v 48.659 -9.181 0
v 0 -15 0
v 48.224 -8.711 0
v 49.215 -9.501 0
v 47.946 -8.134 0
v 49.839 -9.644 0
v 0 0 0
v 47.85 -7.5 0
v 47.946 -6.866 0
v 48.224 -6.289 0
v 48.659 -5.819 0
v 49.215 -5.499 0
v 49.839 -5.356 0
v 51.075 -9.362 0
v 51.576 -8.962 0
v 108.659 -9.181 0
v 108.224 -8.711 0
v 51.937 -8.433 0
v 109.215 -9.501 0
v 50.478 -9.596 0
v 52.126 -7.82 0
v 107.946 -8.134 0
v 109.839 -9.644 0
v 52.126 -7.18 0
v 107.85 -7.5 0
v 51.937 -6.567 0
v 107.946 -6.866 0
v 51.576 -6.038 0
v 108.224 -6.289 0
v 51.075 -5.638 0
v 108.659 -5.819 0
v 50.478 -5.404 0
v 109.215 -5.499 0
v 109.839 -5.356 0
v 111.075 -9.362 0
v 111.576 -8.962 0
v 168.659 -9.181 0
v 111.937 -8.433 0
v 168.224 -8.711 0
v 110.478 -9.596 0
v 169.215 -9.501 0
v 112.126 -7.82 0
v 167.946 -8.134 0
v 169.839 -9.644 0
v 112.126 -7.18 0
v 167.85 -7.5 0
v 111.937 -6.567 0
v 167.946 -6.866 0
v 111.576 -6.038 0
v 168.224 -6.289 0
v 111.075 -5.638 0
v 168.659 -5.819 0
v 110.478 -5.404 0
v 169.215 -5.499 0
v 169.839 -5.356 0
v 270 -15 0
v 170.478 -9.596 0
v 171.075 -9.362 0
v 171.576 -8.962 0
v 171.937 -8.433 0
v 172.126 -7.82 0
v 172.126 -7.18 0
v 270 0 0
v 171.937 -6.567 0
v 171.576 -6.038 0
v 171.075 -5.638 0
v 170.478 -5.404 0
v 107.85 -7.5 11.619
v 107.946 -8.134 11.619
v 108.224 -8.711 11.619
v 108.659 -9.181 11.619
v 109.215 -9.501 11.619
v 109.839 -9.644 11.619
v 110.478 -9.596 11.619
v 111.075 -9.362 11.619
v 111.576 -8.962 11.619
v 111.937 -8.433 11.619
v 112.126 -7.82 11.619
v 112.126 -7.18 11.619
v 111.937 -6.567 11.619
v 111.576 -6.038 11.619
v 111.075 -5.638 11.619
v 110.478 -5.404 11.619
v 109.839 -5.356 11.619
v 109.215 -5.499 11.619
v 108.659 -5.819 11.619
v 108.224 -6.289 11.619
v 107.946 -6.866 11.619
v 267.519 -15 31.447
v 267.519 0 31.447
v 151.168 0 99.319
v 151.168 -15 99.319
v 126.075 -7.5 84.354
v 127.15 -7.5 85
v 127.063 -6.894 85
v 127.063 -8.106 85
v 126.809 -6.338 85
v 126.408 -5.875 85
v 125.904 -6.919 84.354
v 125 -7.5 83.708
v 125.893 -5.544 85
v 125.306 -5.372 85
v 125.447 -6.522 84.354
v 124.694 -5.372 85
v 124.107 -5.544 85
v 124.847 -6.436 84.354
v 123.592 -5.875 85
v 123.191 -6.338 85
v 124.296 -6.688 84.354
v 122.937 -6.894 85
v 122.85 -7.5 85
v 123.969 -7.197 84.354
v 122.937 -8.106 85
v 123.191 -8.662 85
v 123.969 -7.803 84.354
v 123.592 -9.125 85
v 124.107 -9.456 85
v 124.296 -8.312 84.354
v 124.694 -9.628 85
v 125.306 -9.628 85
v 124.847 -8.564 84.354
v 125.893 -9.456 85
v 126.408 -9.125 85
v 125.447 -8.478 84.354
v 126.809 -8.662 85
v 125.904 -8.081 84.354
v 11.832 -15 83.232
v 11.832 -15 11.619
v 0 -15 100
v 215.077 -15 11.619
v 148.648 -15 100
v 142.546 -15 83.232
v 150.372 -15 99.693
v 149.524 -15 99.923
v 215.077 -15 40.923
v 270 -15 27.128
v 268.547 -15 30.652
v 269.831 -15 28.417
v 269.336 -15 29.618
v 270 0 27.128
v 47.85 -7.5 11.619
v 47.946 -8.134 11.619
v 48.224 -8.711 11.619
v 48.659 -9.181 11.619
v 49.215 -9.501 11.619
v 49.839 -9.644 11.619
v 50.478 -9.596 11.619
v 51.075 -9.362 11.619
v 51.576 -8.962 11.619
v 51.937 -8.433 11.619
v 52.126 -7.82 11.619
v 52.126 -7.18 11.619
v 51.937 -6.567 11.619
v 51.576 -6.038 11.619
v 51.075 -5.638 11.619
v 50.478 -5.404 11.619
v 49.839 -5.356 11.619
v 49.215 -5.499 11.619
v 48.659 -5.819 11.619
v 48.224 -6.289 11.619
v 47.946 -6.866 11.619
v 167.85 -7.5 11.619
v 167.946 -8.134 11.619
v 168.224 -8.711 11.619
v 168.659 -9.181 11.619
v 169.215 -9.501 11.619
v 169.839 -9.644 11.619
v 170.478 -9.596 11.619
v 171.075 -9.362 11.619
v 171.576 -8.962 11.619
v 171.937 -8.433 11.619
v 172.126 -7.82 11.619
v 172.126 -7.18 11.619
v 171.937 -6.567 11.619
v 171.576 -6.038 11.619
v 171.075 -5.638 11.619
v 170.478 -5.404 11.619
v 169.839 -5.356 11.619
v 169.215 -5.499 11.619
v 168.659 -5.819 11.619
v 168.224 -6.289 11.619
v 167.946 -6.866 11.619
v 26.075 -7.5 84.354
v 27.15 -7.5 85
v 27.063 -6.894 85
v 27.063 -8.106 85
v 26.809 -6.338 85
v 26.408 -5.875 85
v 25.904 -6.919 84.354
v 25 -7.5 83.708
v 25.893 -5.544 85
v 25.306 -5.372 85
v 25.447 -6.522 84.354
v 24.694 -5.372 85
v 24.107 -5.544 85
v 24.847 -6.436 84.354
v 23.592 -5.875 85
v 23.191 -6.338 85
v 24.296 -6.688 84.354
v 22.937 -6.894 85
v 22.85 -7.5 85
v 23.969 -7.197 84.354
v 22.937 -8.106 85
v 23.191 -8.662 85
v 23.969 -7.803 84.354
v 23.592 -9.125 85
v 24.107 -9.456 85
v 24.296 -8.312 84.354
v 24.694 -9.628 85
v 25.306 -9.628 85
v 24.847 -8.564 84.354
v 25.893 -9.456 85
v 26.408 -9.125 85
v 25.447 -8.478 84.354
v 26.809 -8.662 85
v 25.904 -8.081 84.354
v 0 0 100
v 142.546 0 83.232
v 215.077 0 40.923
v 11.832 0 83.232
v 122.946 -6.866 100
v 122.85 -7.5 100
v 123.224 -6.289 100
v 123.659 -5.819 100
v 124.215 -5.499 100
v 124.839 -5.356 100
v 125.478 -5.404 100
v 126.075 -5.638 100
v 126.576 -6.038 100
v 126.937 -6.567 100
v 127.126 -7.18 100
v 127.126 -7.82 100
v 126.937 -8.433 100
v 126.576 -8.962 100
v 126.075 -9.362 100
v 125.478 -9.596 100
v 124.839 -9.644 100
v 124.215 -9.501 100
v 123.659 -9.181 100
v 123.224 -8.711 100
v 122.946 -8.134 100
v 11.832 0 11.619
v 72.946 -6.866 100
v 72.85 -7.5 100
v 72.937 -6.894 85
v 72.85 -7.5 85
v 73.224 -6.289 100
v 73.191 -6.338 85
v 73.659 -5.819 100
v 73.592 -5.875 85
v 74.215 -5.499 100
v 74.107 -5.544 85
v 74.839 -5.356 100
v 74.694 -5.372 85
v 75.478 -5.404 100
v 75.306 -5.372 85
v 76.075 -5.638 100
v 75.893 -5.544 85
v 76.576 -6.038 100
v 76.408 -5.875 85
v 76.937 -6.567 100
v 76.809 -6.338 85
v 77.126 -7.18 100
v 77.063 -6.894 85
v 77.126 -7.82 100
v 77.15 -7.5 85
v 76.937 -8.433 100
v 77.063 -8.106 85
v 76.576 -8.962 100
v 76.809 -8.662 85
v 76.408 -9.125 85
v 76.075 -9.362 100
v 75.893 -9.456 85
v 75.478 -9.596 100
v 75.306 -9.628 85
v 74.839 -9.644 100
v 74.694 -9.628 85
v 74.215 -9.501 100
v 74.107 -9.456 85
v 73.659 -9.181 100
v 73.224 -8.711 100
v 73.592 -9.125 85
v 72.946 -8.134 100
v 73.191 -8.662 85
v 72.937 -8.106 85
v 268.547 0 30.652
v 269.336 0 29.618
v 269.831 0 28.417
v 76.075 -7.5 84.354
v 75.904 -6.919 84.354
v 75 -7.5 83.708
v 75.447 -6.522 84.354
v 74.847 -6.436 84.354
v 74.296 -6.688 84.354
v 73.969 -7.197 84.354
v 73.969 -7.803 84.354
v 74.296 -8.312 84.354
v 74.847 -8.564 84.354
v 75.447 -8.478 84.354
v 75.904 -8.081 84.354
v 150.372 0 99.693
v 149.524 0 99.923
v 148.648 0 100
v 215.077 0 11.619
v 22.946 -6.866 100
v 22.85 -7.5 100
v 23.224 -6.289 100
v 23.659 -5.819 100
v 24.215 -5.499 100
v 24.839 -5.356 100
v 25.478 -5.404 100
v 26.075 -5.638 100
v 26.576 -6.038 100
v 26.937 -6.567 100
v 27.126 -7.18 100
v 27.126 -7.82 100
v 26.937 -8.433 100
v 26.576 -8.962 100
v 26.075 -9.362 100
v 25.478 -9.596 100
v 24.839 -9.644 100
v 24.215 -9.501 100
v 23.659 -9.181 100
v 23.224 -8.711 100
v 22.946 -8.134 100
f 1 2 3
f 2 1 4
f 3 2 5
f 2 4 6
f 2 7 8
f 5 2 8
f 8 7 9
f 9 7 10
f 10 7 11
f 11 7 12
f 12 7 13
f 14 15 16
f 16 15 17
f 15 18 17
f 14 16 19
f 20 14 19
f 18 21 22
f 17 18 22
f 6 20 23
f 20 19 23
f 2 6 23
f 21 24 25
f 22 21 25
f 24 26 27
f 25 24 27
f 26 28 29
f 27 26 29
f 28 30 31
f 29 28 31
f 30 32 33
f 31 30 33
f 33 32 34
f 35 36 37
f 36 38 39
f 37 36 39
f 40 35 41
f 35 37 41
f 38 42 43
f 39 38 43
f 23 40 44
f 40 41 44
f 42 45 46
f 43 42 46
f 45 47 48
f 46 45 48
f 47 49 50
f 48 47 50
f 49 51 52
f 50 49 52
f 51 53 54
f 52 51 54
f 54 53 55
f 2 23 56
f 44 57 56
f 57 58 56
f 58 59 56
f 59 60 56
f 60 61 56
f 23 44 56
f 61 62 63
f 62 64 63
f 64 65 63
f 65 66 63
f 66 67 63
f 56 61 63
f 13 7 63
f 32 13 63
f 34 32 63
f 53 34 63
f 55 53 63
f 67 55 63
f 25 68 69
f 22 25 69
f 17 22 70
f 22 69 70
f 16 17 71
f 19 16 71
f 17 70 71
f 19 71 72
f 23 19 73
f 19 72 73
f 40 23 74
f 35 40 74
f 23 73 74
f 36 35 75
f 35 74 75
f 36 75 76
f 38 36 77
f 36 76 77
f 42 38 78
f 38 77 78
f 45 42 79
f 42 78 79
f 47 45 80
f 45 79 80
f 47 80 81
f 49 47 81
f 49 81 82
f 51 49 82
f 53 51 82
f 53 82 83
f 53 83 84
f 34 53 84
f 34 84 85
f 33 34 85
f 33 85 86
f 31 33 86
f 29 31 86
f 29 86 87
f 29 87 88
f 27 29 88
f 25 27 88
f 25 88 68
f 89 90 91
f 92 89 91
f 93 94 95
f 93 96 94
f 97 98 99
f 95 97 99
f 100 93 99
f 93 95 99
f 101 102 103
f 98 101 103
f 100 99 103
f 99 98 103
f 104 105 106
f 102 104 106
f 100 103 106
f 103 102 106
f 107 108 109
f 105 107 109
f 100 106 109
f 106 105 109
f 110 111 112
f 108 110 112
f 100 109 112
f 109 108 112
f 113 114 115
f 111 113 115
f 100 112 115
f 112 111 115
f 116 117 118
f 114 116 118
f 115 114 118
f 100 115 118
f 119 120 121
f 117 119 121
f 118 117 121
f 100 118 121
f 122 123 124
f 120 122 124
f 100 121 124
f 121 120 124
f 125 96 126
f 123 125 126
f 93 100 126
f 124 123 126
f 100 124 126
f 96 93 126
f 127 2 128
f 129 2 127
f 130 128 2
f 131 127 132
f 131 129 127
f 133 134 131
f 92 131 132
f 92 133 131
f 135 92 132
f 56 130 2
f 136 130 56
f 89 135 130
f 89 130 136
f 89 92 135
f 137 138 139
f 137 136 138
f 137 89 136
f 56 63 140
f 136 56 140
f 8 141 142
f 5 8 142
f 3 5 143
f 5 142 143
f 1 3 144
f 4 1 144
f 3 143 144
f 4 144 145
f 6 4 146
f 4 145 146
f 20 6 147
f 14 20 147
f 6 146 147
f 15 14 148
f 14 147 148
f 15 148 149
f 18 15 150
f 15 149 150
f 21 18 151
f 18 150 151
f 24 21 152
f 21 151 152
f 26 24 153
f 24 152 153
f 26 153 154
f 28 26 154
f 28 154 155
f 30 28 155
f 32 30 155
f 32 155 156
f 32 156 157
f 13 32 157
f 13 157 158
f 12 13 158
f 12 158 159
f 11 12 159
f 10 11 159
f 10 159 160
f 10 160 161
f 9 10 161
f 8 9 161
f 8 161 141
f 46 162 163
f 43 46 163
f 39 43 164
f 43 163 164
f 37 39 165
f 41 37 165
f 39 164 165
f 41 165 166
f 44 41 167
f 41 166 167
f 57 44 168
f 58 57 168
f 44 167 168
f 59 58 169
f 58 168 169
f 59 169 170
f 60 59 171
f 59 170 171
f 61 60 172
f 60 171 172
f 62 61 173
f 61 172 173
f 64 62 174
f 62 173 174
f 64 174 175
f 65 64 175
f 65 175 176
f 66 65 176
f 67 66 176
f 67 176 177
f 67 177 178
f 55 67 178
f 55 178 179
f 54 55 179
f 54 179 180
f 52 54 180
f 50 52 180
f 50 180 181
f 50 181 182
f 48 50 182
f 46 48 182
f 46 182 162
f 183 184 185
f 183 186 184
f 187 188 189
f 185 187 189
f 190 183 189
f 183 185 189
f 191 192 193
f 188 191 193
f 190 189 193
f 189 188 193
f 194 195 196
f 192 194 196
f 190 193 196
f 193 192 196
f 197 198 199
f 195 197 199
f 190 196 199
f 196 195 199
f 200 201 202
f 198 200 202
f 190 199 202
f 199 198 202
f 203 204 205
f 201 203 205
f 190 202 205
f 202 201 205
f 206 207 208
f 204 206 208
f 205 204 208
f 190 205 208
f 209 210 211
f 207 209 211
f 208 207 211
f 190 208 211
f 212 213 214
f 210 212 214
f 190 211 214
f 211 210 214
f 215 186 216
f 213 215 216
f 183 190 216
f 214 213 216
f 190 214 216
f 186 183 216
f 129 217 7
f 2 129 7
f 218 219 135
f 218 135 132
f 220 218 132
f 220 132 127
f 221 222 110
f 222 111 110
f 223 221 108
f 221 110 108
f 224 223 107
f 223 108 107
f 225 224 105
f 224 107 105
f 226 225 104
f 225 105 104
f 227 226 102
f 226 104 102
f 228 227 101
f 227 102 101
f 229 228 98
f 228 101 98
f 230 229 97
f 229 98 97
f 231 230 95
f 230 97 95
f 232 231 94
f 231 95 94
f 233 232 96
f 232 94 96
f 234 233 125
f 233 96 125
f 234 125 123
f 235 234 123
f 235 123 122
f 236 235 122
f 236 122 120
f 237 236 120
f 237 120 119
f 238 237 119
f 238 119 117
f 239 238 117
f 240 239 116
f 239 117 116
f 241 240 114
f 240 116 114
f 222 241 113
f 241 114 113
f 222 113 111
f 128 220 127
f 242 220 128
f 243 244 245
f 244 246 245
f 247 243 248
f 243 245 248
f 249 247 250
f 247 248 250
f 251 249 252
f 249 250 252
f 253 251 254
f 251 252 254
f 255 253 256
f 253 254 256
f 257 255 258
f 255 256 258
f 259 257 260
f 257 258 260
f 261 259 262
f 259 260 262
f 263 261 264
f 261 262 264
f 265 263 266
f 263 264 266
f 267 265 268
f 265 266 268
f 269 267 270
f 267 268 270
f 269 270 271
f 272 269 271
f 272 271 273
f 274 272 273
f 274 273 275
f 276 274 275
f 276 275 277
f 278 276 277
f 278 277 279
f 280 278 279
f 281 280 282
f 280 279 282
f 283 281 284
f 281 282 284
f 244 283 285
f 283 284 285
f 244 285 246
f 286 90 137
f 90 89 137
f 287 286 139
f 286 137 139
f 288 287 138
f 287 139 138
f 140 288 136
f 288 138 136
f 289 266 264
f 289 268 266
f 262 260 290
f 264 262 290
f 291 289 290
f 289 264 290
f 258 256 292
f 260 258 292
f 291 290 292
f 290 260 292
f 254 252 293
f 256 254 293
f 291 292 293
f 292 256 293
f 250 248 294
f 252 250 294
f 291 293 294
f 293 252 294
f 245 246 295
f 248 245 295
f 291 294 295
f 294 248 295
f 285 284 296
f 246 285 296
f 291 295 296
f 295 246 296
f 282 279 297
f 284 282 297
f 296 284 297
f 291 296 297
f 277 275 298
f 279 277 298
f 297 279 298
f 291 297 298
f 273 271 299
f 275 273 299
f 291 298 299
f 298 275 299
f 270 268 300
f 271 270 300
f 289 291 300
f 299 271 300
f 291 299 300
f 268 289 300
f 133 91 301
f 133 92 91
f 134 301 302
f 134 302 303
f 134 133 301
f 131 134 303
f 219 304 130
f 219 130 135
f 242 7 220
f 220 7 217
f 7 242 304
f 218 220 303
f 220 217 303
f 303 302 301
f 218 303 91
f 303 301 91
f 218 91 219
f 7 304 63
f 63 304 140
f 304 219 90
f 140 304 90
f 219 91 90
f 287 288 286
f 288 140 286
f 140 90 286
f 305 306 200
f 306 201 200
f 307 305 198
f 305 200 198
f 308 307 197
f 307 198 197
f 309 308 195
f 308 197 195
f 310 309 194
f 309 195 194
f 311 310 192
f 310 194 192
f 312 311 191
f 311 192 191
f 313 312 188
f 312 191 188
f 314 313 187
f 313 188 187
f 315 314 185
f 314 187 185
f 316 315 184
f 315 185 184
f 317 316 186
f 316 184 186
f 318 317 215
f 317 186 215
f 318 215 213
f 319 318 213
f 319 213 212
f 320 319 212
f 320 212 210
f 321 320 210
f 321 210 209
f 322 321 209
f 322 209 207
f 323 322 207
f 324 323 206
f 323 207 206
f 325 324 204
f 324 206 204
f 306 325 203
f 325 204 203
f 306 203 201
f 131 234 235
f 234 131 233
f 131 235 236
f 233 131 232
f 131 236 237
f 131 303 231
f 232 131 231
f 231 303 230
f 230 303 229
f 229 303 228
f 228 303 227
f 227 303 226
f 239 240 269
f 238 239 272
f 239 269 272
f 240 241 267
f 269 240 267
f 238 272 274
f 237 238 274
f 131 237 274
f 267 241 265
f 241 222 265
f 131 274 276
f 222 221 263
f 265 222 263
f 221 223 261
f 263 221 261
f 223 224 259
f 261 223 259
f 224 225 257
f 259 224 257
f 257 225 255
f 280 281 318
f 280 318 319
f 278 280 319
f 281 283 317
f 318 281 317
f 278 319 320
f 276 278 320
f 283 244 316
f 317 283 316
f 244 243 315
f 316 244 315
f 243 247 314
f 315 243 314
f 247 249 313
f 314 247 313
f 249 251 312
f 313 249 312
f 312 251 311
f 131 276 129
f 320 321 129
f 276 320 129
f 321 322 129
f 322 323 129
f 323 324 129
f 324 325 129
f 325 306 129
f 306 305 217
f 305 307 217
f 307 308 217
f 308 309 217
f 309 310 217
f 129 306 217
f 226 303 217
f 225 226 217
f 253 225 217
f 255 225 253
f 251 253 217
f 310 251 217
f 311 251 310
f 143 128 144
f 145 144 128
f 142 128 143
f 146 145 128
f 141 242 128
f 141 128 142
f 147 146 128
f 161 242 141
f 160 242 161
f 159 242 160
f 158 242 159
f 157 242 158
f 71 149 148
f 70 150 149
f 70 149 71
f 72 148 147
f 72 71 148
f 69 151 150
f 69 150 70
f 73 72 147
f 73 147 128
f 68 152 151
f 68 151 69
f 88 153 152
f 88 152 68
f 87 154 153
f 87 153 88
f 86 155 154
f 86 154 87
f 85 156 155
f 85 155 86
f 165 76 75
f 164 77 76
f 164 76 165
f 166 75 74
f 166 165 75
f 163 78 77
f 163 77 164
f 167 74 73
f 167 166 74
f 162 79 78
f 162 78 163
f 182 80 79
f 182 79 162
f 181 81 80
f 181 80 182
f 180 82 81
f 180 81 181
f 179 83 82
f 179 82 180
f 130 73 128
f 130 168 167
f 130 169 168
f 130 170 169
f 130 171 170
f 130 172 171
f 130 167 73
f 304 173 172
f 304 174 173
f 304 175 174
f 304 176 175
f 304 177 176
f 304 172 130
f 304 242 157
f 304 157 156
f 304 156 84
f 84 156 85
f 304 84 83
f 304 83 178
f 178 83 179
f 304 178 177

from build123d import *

# Parameters (mm, degrees)
F1_DEPTH = 15
F3_D     = 4.3
F3_DEPTH = 15
F3_TIP   = 1.2918503309
F4_R     = 5
F5_R     = 5
F7_DEPTH = 15.001
F9_D     = 4.3
F9_DEPTH = 20
F9_TIP   = 1.2918503309


with BuildPart() as f1:
    # F0 (on Front) → F1 (new body)
    with BuildSketch(Plane.XZ):
        Polygon((0, 100), (0, 0), (150, 0), (270, 0), (270, 30), (150, 100), align=None)
    extrude(amount=F1_DEPTH)

    # F3
    with Locations(Plane.XY.offset(100)):
        with Locations((125, -7.5), (75, -7.5), (25, -7.5)):
            Hole(F3_D / 2, depth=F3_DEPTH)
            with Locations((0, 0, -(F3_DEPTH + F3_TIP / 2))):  # 118° drill point
                Cone(0, F3_D / 2, F3_TIP, mode=Mode.SUBTRACT)

    # F4
    f4_edges = [f1.edges().sort_by_distance(p)[0] for p in [
        (270, -7.5, 30),
    ]]
    fillet(f4_edges, radius=F4_R)

    # F5
    f5_edges = [f1.edges().sort_by_distance(p)[0] for p in [
        (150, -7.5, 100),
    ]]
    fillet(f5_edges, radius=F5_R)

    # F6 (on Front) → F7 (cut, through all)
    with BuildSketch(Plane.XZ):
        Polygon((11.8321627378, 83.2323953509), (11.8321627378, 11.6192111745), (215.076940872, 11.6192111745), (215.076940872, 40.9227917323), (142.5461918116, 83.2323953509), align=None)
    extrude(amount=F7_DEPTH, mode=Mode.SUBTRACT)

    # F9
    with Locations(Plane(origin=(0, 0, 0), x_dir=(1, 0, 0), z_dir=(0, 0, -1))):
        with Locations((50, 7.5), (110, 7.5), (170, 7.5)):
            Hole(F9_D / 2, depth=F9_DEPTH)
            with Locations((0, 0, -(F9_DEPTH + F9_TIP / 2))):  # 118° drill point
                Cone(0, F9_D / 2, F9_TIP, mode=Mode.SUBTRACT)


solid = f1.part
